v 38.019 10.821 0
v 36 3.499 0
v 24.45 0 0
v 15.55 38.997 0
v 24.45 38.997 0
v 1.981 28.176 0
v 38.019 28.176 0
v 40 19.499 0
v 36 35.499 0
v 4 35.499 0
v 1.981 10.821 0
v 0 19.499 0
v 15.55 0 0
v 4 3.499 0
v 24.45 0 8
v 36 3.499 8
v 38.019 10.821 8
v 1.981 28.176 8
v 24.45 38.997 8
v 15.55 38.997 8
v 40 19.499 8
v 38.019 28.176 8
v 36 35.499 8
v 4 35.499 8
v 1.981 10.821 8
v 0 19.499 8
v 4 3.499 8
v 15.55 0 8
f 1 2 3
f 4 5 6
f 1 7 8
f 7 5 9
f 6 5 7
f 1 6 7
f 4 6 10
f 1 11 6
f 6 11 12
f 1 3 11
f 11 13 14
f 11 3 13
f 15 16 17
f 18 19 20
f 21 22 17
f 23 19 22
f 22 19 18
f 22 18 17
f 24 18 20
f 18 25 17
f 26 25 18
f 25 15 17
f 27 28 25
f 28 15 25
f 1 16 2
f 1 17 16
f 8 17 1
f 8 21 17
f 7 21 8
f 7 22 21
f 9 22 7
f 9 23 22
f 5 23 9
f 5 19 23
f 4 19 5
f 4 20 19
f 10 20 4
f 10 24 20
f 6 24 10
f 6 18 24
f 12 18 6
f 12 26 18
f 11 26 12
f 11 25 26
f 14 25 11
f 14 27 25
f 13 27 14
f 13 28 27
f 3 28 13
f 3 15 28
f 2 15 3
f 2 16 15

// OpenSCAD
$fn = 32;

// ----------------------------------------------------------------------
// Flat adaptor: hex_disc, 8 mm thick
// ----------------------------------------------------------------------

// --- parameters (mm) ---
profile_height = 8;       // extrusion height
profile_points = 14;      // points of the closed outline

profile = [[0, 19.499], [1.981, 10.821], [4, 3.499], [15.55, 0], [24.45, 0], [36, 3.499], [38.019, 10.821], [40, 19.499], [38.019, 28.176], [36, 35.499], [24.45, 38.997], [15.55, 38.997], [4, 35.499], [1.981, 28.176]];  // single closed polygon, 14 points, counter clockwise

// --- the one profile operation ---
linear_extrude(height = profile_height) polygon(points = profile);
